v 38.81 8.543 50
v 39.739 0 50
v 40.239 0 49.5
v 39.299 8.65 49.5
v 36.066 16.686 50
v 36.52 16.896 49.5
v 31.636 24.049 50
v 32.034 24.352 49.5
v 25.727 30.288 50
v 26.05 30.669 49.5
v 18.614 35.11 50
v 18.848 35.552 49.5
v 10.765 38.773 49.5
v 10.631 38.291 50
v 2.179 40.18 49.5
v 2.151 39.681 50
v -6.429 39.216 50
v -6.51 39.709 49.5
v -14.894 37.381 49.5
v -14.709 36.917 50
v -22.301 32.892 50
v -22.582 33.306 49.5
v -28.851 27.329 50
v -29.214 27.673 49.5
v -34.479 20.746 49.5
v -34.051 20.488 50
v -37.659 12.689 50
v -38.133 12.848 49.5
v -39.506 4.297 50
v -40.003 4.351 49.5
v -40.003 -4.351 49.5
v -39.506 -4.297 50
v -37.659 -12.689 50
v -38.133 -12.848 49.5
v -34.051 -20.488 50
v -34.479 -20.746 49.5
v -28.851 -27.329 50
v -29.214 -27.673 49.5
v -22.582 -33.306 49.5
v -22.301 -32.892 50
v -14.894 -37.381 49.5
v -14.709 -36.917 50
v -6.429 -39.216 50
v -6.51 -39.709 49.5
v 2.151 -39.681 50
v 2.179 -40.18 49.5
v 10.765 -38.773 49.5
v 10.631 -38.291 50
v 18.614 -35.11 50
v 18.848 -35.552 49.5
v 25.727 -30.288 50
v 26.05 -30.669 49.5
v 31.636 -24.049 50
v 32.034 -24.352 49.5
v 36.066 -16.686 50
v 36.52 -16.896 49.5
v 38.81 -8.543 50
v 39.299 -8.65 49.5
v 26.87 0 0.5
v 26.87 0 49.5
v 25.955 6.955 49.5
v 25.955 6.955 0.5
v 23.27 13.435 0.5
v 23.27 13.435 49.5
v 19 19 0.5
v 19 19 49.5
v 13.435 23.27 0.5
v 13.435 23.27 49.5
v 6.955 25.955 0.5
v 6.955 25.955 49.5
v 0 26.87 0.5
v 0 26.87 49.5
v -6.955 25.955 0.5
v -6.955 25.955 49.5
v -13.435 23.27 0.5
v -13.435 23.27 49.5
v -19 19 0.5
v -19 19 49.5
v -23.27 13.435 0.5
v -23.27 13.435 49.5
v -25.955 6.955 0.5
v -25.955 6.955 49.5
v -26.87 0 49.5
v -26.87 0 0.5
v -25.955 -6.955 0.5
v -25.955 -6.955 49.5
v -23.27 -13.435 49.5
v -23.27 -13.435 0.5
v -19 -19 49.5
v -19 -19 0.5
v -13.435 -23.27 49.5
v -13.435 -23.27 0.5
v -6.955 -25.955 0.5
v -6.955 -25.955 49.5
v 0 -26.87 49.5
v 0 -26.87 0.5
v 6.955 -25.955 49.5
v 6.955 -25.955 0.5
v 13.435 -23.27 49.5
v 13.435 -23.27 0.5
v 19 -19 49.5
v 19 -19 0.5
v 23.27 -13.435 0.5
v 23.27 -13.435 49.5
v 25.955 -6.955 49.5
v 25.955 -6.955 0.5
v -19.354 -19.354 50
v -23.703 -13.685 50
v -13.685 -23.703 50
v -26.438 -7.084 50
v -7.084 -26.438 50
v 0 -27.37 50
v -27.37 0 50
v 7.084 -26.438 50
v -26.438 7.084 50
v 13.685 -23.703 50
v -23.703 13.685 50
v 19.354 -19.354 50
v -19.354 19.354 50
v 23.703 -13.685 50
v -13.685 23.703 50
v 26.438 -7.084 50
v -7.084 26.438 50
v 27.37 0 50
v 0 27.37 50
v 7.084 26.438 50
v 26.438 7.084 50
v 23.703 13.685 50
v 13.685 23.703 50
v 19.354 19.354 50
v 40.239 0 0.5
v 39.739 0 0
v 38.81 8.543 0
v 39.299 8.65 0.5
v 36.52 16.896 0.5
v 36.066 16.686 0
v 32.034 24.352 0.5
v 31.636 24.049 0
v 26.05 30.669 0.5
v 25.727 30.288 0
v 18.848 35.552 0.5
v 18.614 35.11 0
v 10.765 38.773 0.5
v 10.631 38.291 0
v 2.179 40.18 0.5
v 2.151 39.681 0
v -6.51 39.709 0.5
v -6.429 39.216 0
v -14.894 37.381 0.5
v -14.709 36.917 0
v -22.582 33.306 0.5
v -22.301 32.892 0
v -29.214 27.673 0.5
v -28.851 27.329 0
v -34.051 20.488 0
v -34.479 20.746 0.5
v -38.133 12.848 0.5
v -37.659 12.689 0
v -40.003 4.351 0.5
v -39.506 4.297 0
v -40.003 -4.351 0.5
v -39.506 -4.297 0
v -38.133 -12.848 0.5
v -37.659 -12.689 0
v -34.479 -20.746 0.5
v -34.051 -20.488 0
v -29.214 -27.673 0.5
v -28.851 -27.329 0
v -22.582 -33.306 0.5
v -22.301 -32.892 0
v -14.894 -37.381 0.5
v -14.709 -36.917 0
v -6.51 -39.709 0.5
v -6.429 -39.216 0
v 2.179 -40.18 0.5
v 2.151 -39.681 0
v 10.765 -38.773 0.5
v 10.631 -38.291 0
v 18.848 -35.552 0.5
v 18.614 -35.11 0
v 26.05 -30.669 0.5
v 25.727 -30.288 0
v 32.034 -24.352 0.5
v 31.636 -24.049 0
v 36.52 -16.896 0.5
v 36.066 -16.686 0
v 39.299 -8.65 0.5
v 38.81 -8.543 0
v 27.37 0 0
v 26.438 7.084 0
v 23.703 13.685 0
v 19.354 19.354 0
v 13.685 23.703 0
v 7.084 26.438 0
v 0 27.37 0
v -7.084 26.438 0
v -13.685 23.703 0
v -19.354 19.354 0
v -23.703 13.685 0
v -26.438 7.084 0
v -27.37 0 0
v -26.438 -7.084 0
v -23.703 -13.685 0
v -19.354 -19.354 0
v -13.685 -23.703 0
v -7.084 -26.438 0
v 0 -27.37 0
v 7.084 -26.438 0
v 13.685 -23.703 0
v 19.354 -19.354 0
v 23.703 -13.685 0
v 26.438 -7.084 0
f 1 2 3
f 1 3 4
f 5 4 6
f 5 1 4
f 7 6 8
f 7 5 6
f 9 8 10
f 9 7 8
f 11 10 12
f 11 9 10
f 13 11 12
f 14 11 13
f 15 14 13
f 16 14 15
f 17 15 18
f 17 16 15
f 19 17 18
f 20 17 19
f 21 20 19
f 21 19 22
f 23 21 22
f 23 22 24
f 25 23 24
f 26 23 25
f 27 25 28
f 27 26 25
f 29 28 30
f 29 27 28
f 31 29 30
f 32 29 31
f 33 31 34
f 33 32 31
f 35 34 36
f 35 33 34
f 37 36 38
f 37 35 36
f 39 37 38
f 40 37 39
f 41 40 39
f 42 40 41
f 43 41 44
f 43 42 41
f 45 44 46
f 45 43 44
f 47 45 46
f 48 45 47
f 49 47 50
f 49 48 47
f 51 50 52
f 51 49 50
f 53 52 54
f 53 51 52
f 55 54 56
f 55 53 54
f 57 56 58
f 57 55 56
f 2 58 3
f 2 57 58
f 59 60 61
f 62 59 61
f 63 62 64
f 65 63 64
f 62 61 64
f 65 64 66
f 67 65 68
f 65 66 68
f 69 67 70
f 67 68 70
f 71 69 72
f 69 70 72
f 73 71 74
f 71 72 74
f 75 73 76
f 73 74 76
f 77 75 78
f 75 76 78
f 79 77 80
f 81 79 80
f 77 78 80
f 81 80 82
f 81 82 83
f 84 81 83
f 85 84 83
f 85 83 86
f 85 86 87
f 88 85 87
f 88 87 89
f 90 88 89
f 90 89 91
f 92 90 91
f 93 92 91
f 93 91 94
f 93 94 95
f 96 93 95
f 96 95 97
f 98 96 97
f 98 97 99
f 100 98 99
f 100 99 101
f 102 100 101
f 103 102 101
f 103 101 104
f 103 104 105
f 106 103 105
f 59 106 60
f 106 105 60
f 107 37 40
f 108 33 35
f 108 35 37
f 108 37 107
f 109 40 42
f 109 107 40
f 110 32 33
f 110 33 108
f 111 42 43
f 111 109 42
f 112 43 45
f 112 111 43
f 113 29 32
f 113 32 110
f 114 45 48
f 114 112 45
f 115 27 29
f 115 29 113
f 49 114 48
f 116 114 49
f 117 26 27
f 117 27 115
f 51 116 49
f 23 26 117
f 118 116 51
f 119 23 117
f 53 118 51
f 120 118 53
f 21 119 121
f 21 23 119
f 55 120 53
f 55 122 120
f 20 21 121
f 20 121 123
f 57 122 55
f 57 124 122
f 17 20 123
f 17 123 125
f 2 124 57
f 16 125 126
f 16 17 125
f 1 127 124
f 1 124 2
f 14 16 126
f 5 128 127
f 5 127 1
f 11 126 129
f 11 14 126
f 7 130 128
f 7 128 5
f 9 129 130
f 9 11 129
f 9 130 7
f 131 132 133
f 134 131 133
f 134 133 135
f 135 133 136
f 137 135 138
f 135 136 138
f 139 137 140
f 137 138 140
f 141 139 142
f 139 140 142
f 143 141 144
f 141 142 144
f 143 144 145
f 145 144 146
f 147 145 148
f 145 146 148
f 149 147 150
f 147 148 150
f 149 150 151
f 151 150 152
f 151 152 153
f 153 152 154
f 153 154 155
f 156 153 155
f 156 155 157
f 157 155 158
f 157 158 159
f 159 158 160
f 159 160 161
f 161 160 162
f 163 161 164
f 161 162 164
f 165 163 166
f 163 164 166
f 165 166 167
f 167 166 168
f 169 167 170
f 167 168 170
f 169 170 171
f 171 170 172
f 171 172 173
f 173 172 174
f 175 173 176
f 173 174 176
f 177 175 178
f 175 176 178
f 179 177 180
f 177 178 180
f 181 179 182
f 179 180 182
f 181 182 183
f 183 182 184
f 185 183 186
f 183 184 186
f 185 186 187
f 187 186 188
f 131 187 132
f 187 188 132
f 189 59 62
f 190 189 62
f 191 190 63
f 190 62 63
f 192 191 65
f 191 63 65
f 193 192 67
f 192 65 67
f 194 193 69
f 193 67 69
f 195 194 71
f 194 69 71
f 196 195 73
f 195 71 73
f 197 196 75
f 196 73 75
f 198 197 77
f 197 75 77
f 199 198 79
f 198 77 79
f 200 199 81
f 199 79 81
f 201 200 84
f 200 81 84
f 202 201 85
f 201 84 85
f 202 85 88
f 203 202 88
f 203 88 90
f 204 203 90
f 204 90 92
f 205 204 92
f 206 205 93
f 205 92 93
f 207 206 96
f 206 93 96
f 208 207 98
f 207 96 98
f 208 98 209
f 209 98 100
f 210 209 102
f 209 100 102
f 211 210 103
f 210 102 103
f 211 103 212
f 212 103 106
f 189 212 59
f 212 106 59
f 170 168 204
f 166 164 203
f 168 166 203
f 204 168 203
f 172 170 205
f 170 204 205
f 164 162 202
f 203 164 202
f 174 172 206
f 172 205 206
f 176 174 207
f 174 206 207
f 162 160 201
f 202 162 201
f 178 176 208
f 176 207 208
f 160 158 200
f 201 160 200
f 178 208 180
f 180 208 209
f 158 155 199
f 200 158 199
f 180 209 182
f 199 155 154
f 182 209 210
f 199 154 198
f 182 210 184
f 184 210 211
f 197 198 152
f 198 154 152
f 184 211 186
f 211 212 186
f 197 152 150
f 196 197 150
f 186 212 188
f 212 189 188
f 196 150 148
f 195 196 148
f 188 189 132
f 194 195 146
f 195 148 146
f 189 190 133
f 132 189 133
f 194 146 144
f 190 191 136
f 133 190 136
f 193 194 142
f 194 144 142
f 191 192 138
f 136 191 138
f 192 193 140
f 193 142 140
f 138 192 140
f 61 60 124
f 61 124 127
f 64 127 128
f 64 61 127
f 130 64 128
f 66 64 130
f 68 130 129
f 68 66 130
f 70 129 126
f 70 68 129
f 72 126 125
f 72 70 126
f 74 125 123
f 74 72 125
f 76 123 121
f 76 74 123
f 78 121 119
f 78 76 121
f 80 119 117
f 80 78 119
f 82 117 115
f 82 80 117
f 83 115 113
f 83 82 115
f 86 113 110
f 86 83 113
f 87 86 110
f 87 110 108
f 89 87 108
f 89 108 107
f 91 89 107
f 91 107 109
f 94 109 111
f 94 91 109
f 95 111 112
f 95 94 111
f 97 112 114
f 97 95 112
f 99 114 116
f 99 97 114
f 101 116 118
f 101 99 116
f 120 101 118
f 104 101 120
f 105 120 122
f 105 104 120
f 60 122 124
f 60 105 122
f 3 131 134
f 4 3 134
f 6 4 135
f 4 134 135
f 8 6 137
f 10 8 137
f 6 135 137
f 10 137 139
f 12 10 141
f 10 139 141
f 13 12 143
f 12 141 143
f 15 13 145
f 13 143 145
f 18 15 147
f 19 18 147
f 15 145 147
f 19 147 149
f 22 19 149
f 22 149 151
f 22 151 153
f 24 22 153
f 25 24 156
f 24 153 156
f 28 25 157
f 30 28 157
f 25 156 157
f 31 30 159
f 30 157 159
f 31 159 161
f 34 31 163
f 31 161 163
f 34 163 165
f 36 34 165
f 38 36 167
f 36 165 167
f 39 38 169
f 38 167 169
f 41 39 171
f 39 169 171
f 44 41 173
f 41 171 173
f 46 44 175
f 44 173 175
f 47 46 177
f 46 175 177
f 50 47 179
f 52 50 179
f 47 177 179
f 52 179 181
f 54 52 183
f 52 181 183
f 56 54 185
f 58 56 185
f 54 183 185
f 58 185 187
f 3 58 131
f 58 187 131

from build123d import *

# Parameters (mm, degrees)
F0_R     = 40.239299
F1_DEPTH = 50
F2_R     = 26.870231
F3_DEPTH = 62
F4_SIZE  = 0.5


with BuildPart() as f1:
    # F0 (on Top) → F1 (new body)
    with BuildSketch(Plane.XY):
        Circle(F0_R)
    extrude(amount=F1_DEPTH)

    # F2 (on face) → F3 (cut)
    with BuildSketch(Plane.XY.offset(50)):
        Circle(F2_R)
    extrude(amount=-F3_DEPTH, mode=Mode.SUBTRACT)

    # F4
    f4_edges = [f1.edges().sort_by_distance(p)[0] for p in [
        (-40.239299, 0, 50),
        (-26.870231, 0, 50),
        (-40.239299, 0, 0),
        (-26.870231, 0, 0),
    ]]
    chamfer(f4_edges, length=F4_SIZE)


solid = f1.part
